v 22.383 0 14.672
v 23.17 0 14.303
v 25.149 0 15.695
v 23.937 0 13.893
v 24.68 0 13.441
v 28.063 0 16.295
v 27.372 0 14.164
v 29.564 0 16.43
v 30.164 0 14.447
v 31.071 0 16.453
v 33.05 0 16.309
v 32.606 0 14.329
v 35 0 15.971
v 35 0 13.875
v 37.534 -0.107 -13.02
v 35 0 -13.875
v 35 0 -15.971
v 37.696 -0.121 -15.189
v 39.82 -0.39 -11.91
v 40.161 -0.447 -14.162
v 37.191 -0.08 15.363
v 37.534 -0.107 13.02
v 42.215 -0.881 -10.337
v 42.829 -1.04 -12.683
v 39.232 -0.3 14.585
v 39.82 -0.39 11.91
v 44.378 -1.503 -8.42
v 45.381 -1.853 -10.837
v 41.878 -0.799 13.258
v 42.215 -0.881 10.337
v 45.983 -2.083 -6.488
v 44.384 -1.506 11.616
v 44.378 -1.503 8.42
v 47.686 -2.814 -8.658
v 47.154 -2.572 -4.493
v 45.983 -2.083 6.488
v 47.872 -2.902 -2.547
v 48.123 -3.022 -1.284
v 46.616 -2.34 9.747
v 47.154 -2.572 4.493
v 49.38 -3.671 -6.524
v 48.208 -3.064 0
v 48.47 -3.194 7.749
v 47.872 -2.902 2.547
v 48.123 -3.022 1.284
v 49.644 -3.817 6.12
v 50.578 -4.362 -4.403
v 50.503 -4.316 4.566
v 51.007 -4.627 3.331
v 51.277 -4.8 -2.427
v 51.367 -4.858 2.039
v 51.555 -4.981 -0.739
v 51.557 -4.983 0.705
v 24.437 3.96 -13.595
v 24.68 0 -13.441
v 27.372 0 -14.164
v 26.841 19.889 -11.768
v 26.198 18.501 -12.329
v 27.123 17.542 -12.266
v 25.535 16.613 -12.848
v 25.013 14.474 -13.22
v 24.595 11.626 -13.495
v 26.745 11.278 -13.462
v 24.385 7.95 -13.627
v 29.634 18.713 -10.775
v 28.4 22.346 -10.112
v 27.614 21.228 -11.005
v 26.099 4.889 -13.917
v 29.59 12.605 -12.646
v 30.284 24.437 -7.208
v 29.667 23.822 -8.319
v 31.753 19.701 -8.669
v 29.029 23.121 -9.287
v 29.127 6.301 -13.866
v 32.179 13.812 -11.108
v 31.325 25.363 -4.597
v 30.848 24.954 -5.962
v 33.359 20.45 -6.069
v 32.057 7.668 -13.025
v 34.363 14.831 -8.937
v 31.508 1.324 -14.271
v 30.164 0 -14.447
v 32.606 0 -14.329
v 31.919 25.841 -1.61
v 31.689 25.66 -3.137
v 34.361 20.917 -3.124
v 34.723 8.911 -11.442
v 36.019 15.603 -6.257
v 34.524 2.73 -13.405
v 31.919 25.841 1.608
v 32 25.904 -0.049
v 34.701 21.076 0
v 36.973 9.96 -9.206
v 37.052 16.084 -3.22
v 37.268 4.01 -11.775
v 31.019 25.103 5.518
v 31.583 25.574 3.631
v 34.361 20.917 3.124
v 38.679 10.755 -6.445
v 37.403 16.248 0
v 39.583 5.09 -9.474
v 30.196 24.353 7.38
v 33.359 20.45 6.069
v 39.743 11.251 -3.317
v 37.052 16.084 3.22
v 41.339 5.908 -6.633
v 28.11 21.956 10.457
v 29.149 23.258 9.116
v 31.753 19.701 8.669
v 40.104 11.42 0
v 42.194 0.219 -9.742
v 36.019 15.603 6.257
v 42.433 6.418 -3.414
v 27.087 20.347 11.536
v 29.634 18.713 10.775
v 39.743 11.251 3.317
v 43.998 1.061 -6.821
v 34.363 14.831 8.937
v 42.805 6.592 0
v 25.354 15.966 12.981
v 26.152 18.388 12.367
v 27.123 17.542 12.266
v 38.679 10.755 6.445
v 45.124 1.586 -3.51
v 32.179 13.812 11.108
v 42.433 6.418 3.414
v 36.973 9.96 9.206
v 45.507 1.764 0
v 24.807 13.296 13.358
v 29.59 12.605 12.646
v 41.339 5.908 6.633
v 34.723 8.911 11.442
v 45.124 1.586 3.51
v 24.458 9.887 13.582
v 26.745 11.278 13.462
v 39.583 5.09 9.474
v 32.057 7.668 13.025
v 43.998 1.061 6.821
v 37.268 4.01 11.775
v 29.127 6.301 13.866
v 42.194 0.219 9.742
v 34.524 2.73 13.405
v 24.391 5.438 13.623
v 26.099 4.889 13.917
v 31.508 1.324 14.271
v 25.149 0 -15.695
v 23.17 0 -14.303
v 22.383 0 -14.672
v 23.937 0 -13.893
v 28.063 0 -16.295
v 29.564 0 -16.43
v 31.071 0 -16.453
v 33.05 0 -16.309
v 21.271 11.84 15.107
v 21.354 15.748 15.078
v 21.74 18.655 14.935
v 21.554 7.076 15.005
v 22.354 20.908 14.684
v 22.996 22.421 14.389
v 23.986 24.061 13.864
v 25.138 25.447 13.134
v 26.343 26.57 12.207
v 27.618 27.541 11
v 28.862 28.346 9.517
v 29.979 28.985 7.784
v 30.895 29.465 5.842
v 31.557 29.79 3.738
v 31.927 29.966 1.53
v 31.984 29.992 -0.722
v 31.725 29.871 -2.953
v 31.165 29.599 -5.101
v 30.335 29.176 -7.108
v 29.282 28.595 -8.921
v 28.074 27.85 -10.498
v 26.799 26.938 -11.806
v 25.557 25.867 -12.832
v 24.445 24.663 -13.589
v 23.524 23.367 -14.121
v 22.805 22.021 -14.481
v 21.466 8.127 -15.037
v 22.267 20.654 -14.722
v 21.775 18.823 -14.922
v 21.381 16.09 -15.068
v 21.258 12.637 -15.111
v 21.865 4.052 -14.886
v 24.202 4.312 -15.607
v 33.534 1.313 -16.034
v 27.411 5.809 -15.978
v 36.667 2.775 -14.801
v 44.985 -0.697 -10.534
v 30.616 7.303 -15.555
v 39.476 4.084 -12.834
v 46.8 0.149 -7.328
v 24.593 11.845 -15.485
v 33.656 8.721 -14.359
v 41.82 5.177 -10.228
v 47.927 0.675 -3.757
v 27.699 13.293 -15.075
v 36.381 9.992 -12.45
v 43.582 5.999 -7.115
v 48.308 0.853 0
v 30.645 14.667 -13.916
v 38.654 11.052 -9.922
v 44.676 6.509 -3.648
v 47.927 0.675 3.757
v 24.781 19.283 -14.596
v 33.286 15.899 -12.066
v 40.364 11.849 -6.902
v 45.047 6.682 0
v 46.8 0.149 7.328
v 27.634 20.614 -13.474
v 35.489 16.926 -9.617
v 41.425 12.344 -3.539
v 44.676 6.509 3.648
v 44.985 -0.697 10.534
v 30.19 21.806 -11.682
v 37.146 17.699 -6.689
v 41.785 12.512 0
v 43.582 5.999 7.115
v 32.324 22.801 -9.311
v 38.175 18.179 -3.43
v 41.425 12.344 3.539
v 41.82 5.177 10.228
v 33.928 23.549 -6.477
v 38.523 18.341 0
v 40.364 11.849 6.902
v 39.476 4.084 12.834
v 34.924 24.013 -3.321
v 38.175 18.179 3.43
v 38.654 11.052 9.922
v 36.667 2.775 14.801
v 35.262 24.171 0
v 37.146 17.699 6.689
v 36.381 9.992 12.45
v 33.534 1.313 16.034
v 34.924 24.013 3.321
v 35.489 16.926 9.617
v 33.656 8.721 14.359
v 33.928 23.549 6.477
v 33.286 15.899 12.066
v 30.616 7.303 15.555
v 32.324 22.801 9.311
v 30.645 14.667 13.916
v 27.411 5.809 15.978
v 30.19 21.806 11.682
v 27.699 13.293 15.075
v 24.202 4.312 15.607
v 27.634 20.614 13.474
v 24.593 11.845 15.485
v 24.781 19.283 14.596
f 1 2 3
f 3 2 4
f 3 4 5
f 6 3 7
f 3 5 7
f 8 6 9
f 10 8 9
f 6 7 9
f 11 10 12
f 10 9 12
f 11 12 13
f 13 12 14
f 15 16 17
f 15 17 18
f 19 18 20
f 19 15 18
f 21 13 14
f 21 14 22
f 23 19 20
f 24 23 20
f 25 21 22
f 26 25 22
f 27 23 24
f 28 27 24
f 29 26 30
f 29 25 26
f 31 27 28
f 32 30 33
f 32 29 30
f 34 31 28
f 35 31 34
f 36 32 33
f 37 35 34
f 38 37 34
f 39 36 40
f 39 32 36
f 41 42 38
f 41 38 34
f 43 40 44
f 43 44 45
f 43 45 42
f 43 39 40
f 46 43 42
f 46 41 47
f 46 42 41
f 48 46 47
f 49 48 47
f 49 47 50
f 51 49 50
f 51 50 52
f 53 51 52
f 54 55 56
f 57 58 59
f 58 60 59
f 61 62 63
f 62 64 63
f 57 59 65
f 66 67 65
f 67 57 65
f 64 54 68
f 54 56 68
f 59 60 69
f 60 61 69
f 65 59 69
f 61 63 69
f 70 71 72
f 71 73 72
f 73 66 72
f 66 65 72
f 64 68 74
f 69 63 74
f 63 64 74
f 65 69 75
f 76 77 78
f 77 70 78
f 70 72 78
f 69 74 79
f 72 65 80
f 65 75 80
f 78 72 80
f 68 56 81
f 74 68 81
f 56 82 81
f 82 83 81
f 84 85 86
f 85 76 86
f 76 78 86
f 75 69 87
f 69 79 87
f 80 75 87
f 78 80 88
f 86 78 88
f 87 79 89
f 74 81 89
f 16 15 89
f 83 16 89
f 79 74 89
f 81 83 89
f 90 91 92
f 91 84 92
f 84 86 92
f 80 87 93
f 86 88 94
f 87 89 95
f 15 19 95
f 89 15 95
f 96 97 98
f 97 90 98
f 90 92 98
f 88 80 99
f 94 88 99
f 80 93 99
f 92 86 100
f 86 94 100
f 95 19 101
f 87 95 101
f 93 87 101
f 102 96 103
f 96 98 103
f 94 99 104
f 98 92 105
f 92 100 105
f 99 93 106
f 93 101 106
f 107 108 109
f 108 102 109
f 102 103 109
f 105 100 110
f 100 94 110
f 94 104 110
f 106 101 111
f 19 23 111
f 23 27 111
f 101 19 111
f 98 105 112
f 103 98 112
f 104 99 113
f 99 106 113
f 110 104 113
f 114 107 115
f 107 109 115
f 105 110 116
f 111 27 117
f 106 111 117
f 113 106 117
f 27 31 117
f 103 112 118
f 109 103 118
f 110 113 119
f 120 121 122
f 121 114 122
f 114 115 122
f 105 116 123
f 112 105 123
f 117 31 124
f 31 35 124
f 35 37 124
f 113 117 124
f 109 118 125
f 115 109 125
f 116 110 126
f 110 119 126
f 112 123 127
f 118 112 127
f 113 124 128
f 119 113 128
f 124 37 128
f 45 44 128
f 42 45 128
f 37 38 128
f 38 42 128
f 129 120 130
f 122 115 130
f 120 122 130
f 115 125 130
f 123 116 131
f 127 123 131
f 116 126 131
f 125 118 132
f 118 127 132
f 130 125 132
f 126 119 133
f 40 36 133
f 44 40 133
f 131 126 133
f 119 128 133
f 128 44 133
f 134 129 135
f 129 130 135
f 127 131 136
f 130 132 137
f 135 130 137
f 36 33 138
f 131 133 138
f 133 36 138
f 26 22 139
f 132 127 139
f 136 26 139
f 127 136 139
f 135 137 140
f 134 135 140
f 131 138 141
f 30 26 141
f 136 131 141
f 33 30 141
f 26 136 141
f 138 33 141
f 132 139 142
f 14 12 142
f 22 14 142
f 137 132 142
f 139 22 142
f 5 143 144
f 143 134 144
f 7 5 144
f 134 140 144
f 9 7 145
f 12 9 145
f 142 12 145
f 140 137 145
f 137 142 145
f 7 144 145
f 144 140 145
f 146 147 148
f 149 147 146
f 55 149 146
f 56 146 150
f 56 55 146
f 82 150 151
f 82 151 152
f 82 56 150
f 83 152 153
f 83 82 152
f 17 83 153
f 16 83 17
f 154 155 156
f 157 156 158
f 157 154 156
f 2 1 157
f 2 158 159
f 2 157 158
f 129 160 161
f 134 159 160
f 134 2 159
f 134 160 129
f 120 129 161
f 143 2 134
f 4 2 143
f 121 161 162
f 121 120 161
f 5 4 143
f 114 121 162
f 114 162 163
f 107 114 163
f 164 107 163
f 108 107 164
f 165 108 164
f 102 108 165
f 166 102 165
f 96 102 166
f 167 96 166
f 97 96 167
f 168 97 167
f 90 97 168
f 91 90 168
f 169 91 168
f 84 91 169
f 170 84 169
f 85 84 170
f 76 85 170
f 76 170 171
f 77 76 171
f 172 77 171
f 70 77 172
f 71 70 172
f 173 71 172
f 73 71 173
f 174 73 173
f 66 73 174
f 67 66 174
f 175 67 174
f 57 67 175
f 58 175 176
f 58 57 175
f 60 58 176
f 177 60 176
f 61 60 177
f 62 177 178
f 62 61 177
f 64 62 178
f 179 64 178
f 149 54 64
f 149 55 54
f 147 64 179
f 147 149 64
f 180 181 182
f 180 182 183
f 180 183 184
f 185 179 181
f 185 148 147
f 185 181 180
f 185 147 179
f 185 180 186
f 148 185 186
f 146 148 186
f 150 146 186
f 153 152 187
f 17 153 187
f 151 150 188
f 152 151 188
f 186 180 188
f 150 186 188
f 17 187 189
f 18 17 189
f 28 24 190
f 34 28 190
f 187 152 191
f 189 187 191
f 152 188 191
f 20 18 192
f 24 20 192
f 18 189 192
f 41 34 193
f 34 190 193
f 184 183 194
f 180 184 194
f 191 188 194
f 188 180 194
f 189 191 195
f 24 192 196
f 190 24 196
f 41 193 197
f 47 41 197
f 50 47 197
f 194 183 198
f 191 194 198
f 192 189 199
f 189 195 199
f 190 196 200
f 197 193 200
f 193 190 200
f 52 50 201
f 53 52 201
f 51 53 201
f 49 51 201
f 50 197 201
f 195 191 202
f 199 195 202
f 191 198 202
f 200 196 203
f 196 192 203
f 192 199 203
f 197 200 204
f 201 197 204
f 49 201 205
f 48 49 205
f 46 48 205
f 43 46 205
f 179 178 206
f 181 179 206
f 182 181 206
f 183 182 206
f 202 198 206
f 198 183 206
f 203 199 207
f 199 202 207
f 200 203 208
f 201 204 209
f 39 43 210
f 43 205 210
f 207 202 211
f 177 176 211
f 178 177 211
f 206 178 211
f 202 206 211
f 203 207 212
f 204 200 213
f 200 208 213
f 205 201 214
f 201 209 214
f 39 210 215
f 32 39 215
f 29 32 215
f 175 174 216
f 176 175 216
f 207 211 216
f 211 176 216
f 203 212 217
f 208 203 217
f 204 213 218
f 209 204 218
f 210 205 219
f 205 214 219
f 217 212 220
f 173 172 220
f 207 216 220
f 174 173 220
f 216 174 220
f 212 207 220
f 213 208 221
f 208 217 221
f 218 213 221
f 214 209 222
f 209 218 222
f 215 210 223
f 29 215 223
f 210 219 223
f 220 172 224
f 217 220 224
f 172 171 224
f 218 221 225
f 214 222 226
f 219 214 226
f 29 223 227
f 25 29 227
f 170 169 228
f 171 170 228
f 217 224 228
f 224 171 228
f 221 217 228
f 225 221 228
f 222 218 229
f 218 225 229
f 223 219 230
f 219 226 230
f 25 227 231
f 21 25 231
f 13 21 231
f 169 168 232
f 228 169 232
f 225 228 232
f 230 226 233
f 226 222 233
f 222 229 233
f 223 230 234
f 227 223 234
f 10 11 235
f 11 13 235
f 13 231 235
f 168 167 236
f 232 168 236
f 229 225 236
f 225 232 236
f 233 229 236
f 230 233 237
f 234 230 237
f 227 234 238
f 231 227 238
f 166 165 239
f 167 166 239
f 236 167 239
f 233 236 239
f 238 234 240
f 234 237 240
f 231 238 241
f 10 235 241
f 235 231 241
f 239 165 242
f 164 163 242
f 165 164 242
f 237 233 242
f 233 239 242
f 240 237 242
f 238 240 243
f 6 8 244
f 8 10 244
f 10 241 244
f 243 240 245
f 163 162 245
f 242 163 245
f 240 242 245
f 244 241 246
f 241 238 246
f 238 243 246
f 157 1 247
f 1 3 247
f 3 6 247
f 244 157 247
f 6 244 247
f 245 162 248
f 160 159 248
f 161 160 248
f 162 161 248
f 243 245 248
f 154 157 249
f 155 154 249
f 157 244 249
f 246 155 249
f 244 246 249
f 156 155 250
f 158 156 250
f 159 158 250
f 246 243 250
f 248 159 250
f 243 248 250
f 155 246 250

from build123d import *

# Parameters (mm, degrees)
ESQUISSE7_R                  = 16
ENL_V_MAT_EXTRU_4_DEPTH      = 31
ENL_V_MAT_EXTRU_4_DEPTH_BACK = 20.75582071
ENL_V_MAT_EXTRU_5_DEPTH      = 18.457623262
ENL_V_MAT_EXTRU_5_DEPTH_BACK = 18.457623262


with BuildPart() as part:
    # Esquisse6 → Révolution3 (revolve)
    with BuildSketch(Plane.XY, mode=Mode.PRIVATE) as r_volution3_sk:
        Polygon((30.254629316, 29.023433988), (49.837753266, -5.976566012), (51.58312395, -5), (32, 30), align=None)
    revolve(r_volution3_sk.sketch.rotate(Axis((16, 30, 0), (0.422618262, -0.906307787, 0)), 180), axis=Axis((16, 30, 0), (0.422618262, -0.906307787, 0)))  # turned: the seam where the file's is

    # Esquisse7 → Enlèv. mat.-Extru.4 (cut, two sides)
    with BuildSketch(Plane(origin=(0, 0, 0), x_dir=(1, 0, 0), z_dir=(0, 1, 0))) as enl_v_mat_extru_4_sk:
        with Locations((16, 0)):
            Circle(ESQUISSE7_R)
    extrude(amount=ENL_V_MAT_EXTRU_4_DEPTH, mode=Mode.SUBTRACT)
    extrude(enl_v_mat_extru_4_sk.sketch, amount=-ENL_V_MAT_EXTRU_4_DEPTH_BACK, mode=Mode.SUBTRACT)

    # Esquisse8 → Enlèv. mat.-Extru.5 (cut, two sides)
    with BuildSketch(Plane.XY) as enl_v_mat_extru_5_sk:
        with BuildLine():
            Line((0, 0), (35, 0))
            ThreePointArc((35, 0), (56.213203436, -8.786796564), (65, -30))
            Line((65, -30), (0, -30))
            Line((0, -30), (0, 0))
        make_face()
    extrude(amount=ENL_V_MAT_EXTRU_5_DEPTH, mode=Mode.SUBTRACT)
    extrude(enl_v_mat_extru_5_sk.sketch, amount=-ENL_V_MAT_EXTRU_5_DEPTH_BACK, mode=Mode.SUBTRACT)


solid = part.part
